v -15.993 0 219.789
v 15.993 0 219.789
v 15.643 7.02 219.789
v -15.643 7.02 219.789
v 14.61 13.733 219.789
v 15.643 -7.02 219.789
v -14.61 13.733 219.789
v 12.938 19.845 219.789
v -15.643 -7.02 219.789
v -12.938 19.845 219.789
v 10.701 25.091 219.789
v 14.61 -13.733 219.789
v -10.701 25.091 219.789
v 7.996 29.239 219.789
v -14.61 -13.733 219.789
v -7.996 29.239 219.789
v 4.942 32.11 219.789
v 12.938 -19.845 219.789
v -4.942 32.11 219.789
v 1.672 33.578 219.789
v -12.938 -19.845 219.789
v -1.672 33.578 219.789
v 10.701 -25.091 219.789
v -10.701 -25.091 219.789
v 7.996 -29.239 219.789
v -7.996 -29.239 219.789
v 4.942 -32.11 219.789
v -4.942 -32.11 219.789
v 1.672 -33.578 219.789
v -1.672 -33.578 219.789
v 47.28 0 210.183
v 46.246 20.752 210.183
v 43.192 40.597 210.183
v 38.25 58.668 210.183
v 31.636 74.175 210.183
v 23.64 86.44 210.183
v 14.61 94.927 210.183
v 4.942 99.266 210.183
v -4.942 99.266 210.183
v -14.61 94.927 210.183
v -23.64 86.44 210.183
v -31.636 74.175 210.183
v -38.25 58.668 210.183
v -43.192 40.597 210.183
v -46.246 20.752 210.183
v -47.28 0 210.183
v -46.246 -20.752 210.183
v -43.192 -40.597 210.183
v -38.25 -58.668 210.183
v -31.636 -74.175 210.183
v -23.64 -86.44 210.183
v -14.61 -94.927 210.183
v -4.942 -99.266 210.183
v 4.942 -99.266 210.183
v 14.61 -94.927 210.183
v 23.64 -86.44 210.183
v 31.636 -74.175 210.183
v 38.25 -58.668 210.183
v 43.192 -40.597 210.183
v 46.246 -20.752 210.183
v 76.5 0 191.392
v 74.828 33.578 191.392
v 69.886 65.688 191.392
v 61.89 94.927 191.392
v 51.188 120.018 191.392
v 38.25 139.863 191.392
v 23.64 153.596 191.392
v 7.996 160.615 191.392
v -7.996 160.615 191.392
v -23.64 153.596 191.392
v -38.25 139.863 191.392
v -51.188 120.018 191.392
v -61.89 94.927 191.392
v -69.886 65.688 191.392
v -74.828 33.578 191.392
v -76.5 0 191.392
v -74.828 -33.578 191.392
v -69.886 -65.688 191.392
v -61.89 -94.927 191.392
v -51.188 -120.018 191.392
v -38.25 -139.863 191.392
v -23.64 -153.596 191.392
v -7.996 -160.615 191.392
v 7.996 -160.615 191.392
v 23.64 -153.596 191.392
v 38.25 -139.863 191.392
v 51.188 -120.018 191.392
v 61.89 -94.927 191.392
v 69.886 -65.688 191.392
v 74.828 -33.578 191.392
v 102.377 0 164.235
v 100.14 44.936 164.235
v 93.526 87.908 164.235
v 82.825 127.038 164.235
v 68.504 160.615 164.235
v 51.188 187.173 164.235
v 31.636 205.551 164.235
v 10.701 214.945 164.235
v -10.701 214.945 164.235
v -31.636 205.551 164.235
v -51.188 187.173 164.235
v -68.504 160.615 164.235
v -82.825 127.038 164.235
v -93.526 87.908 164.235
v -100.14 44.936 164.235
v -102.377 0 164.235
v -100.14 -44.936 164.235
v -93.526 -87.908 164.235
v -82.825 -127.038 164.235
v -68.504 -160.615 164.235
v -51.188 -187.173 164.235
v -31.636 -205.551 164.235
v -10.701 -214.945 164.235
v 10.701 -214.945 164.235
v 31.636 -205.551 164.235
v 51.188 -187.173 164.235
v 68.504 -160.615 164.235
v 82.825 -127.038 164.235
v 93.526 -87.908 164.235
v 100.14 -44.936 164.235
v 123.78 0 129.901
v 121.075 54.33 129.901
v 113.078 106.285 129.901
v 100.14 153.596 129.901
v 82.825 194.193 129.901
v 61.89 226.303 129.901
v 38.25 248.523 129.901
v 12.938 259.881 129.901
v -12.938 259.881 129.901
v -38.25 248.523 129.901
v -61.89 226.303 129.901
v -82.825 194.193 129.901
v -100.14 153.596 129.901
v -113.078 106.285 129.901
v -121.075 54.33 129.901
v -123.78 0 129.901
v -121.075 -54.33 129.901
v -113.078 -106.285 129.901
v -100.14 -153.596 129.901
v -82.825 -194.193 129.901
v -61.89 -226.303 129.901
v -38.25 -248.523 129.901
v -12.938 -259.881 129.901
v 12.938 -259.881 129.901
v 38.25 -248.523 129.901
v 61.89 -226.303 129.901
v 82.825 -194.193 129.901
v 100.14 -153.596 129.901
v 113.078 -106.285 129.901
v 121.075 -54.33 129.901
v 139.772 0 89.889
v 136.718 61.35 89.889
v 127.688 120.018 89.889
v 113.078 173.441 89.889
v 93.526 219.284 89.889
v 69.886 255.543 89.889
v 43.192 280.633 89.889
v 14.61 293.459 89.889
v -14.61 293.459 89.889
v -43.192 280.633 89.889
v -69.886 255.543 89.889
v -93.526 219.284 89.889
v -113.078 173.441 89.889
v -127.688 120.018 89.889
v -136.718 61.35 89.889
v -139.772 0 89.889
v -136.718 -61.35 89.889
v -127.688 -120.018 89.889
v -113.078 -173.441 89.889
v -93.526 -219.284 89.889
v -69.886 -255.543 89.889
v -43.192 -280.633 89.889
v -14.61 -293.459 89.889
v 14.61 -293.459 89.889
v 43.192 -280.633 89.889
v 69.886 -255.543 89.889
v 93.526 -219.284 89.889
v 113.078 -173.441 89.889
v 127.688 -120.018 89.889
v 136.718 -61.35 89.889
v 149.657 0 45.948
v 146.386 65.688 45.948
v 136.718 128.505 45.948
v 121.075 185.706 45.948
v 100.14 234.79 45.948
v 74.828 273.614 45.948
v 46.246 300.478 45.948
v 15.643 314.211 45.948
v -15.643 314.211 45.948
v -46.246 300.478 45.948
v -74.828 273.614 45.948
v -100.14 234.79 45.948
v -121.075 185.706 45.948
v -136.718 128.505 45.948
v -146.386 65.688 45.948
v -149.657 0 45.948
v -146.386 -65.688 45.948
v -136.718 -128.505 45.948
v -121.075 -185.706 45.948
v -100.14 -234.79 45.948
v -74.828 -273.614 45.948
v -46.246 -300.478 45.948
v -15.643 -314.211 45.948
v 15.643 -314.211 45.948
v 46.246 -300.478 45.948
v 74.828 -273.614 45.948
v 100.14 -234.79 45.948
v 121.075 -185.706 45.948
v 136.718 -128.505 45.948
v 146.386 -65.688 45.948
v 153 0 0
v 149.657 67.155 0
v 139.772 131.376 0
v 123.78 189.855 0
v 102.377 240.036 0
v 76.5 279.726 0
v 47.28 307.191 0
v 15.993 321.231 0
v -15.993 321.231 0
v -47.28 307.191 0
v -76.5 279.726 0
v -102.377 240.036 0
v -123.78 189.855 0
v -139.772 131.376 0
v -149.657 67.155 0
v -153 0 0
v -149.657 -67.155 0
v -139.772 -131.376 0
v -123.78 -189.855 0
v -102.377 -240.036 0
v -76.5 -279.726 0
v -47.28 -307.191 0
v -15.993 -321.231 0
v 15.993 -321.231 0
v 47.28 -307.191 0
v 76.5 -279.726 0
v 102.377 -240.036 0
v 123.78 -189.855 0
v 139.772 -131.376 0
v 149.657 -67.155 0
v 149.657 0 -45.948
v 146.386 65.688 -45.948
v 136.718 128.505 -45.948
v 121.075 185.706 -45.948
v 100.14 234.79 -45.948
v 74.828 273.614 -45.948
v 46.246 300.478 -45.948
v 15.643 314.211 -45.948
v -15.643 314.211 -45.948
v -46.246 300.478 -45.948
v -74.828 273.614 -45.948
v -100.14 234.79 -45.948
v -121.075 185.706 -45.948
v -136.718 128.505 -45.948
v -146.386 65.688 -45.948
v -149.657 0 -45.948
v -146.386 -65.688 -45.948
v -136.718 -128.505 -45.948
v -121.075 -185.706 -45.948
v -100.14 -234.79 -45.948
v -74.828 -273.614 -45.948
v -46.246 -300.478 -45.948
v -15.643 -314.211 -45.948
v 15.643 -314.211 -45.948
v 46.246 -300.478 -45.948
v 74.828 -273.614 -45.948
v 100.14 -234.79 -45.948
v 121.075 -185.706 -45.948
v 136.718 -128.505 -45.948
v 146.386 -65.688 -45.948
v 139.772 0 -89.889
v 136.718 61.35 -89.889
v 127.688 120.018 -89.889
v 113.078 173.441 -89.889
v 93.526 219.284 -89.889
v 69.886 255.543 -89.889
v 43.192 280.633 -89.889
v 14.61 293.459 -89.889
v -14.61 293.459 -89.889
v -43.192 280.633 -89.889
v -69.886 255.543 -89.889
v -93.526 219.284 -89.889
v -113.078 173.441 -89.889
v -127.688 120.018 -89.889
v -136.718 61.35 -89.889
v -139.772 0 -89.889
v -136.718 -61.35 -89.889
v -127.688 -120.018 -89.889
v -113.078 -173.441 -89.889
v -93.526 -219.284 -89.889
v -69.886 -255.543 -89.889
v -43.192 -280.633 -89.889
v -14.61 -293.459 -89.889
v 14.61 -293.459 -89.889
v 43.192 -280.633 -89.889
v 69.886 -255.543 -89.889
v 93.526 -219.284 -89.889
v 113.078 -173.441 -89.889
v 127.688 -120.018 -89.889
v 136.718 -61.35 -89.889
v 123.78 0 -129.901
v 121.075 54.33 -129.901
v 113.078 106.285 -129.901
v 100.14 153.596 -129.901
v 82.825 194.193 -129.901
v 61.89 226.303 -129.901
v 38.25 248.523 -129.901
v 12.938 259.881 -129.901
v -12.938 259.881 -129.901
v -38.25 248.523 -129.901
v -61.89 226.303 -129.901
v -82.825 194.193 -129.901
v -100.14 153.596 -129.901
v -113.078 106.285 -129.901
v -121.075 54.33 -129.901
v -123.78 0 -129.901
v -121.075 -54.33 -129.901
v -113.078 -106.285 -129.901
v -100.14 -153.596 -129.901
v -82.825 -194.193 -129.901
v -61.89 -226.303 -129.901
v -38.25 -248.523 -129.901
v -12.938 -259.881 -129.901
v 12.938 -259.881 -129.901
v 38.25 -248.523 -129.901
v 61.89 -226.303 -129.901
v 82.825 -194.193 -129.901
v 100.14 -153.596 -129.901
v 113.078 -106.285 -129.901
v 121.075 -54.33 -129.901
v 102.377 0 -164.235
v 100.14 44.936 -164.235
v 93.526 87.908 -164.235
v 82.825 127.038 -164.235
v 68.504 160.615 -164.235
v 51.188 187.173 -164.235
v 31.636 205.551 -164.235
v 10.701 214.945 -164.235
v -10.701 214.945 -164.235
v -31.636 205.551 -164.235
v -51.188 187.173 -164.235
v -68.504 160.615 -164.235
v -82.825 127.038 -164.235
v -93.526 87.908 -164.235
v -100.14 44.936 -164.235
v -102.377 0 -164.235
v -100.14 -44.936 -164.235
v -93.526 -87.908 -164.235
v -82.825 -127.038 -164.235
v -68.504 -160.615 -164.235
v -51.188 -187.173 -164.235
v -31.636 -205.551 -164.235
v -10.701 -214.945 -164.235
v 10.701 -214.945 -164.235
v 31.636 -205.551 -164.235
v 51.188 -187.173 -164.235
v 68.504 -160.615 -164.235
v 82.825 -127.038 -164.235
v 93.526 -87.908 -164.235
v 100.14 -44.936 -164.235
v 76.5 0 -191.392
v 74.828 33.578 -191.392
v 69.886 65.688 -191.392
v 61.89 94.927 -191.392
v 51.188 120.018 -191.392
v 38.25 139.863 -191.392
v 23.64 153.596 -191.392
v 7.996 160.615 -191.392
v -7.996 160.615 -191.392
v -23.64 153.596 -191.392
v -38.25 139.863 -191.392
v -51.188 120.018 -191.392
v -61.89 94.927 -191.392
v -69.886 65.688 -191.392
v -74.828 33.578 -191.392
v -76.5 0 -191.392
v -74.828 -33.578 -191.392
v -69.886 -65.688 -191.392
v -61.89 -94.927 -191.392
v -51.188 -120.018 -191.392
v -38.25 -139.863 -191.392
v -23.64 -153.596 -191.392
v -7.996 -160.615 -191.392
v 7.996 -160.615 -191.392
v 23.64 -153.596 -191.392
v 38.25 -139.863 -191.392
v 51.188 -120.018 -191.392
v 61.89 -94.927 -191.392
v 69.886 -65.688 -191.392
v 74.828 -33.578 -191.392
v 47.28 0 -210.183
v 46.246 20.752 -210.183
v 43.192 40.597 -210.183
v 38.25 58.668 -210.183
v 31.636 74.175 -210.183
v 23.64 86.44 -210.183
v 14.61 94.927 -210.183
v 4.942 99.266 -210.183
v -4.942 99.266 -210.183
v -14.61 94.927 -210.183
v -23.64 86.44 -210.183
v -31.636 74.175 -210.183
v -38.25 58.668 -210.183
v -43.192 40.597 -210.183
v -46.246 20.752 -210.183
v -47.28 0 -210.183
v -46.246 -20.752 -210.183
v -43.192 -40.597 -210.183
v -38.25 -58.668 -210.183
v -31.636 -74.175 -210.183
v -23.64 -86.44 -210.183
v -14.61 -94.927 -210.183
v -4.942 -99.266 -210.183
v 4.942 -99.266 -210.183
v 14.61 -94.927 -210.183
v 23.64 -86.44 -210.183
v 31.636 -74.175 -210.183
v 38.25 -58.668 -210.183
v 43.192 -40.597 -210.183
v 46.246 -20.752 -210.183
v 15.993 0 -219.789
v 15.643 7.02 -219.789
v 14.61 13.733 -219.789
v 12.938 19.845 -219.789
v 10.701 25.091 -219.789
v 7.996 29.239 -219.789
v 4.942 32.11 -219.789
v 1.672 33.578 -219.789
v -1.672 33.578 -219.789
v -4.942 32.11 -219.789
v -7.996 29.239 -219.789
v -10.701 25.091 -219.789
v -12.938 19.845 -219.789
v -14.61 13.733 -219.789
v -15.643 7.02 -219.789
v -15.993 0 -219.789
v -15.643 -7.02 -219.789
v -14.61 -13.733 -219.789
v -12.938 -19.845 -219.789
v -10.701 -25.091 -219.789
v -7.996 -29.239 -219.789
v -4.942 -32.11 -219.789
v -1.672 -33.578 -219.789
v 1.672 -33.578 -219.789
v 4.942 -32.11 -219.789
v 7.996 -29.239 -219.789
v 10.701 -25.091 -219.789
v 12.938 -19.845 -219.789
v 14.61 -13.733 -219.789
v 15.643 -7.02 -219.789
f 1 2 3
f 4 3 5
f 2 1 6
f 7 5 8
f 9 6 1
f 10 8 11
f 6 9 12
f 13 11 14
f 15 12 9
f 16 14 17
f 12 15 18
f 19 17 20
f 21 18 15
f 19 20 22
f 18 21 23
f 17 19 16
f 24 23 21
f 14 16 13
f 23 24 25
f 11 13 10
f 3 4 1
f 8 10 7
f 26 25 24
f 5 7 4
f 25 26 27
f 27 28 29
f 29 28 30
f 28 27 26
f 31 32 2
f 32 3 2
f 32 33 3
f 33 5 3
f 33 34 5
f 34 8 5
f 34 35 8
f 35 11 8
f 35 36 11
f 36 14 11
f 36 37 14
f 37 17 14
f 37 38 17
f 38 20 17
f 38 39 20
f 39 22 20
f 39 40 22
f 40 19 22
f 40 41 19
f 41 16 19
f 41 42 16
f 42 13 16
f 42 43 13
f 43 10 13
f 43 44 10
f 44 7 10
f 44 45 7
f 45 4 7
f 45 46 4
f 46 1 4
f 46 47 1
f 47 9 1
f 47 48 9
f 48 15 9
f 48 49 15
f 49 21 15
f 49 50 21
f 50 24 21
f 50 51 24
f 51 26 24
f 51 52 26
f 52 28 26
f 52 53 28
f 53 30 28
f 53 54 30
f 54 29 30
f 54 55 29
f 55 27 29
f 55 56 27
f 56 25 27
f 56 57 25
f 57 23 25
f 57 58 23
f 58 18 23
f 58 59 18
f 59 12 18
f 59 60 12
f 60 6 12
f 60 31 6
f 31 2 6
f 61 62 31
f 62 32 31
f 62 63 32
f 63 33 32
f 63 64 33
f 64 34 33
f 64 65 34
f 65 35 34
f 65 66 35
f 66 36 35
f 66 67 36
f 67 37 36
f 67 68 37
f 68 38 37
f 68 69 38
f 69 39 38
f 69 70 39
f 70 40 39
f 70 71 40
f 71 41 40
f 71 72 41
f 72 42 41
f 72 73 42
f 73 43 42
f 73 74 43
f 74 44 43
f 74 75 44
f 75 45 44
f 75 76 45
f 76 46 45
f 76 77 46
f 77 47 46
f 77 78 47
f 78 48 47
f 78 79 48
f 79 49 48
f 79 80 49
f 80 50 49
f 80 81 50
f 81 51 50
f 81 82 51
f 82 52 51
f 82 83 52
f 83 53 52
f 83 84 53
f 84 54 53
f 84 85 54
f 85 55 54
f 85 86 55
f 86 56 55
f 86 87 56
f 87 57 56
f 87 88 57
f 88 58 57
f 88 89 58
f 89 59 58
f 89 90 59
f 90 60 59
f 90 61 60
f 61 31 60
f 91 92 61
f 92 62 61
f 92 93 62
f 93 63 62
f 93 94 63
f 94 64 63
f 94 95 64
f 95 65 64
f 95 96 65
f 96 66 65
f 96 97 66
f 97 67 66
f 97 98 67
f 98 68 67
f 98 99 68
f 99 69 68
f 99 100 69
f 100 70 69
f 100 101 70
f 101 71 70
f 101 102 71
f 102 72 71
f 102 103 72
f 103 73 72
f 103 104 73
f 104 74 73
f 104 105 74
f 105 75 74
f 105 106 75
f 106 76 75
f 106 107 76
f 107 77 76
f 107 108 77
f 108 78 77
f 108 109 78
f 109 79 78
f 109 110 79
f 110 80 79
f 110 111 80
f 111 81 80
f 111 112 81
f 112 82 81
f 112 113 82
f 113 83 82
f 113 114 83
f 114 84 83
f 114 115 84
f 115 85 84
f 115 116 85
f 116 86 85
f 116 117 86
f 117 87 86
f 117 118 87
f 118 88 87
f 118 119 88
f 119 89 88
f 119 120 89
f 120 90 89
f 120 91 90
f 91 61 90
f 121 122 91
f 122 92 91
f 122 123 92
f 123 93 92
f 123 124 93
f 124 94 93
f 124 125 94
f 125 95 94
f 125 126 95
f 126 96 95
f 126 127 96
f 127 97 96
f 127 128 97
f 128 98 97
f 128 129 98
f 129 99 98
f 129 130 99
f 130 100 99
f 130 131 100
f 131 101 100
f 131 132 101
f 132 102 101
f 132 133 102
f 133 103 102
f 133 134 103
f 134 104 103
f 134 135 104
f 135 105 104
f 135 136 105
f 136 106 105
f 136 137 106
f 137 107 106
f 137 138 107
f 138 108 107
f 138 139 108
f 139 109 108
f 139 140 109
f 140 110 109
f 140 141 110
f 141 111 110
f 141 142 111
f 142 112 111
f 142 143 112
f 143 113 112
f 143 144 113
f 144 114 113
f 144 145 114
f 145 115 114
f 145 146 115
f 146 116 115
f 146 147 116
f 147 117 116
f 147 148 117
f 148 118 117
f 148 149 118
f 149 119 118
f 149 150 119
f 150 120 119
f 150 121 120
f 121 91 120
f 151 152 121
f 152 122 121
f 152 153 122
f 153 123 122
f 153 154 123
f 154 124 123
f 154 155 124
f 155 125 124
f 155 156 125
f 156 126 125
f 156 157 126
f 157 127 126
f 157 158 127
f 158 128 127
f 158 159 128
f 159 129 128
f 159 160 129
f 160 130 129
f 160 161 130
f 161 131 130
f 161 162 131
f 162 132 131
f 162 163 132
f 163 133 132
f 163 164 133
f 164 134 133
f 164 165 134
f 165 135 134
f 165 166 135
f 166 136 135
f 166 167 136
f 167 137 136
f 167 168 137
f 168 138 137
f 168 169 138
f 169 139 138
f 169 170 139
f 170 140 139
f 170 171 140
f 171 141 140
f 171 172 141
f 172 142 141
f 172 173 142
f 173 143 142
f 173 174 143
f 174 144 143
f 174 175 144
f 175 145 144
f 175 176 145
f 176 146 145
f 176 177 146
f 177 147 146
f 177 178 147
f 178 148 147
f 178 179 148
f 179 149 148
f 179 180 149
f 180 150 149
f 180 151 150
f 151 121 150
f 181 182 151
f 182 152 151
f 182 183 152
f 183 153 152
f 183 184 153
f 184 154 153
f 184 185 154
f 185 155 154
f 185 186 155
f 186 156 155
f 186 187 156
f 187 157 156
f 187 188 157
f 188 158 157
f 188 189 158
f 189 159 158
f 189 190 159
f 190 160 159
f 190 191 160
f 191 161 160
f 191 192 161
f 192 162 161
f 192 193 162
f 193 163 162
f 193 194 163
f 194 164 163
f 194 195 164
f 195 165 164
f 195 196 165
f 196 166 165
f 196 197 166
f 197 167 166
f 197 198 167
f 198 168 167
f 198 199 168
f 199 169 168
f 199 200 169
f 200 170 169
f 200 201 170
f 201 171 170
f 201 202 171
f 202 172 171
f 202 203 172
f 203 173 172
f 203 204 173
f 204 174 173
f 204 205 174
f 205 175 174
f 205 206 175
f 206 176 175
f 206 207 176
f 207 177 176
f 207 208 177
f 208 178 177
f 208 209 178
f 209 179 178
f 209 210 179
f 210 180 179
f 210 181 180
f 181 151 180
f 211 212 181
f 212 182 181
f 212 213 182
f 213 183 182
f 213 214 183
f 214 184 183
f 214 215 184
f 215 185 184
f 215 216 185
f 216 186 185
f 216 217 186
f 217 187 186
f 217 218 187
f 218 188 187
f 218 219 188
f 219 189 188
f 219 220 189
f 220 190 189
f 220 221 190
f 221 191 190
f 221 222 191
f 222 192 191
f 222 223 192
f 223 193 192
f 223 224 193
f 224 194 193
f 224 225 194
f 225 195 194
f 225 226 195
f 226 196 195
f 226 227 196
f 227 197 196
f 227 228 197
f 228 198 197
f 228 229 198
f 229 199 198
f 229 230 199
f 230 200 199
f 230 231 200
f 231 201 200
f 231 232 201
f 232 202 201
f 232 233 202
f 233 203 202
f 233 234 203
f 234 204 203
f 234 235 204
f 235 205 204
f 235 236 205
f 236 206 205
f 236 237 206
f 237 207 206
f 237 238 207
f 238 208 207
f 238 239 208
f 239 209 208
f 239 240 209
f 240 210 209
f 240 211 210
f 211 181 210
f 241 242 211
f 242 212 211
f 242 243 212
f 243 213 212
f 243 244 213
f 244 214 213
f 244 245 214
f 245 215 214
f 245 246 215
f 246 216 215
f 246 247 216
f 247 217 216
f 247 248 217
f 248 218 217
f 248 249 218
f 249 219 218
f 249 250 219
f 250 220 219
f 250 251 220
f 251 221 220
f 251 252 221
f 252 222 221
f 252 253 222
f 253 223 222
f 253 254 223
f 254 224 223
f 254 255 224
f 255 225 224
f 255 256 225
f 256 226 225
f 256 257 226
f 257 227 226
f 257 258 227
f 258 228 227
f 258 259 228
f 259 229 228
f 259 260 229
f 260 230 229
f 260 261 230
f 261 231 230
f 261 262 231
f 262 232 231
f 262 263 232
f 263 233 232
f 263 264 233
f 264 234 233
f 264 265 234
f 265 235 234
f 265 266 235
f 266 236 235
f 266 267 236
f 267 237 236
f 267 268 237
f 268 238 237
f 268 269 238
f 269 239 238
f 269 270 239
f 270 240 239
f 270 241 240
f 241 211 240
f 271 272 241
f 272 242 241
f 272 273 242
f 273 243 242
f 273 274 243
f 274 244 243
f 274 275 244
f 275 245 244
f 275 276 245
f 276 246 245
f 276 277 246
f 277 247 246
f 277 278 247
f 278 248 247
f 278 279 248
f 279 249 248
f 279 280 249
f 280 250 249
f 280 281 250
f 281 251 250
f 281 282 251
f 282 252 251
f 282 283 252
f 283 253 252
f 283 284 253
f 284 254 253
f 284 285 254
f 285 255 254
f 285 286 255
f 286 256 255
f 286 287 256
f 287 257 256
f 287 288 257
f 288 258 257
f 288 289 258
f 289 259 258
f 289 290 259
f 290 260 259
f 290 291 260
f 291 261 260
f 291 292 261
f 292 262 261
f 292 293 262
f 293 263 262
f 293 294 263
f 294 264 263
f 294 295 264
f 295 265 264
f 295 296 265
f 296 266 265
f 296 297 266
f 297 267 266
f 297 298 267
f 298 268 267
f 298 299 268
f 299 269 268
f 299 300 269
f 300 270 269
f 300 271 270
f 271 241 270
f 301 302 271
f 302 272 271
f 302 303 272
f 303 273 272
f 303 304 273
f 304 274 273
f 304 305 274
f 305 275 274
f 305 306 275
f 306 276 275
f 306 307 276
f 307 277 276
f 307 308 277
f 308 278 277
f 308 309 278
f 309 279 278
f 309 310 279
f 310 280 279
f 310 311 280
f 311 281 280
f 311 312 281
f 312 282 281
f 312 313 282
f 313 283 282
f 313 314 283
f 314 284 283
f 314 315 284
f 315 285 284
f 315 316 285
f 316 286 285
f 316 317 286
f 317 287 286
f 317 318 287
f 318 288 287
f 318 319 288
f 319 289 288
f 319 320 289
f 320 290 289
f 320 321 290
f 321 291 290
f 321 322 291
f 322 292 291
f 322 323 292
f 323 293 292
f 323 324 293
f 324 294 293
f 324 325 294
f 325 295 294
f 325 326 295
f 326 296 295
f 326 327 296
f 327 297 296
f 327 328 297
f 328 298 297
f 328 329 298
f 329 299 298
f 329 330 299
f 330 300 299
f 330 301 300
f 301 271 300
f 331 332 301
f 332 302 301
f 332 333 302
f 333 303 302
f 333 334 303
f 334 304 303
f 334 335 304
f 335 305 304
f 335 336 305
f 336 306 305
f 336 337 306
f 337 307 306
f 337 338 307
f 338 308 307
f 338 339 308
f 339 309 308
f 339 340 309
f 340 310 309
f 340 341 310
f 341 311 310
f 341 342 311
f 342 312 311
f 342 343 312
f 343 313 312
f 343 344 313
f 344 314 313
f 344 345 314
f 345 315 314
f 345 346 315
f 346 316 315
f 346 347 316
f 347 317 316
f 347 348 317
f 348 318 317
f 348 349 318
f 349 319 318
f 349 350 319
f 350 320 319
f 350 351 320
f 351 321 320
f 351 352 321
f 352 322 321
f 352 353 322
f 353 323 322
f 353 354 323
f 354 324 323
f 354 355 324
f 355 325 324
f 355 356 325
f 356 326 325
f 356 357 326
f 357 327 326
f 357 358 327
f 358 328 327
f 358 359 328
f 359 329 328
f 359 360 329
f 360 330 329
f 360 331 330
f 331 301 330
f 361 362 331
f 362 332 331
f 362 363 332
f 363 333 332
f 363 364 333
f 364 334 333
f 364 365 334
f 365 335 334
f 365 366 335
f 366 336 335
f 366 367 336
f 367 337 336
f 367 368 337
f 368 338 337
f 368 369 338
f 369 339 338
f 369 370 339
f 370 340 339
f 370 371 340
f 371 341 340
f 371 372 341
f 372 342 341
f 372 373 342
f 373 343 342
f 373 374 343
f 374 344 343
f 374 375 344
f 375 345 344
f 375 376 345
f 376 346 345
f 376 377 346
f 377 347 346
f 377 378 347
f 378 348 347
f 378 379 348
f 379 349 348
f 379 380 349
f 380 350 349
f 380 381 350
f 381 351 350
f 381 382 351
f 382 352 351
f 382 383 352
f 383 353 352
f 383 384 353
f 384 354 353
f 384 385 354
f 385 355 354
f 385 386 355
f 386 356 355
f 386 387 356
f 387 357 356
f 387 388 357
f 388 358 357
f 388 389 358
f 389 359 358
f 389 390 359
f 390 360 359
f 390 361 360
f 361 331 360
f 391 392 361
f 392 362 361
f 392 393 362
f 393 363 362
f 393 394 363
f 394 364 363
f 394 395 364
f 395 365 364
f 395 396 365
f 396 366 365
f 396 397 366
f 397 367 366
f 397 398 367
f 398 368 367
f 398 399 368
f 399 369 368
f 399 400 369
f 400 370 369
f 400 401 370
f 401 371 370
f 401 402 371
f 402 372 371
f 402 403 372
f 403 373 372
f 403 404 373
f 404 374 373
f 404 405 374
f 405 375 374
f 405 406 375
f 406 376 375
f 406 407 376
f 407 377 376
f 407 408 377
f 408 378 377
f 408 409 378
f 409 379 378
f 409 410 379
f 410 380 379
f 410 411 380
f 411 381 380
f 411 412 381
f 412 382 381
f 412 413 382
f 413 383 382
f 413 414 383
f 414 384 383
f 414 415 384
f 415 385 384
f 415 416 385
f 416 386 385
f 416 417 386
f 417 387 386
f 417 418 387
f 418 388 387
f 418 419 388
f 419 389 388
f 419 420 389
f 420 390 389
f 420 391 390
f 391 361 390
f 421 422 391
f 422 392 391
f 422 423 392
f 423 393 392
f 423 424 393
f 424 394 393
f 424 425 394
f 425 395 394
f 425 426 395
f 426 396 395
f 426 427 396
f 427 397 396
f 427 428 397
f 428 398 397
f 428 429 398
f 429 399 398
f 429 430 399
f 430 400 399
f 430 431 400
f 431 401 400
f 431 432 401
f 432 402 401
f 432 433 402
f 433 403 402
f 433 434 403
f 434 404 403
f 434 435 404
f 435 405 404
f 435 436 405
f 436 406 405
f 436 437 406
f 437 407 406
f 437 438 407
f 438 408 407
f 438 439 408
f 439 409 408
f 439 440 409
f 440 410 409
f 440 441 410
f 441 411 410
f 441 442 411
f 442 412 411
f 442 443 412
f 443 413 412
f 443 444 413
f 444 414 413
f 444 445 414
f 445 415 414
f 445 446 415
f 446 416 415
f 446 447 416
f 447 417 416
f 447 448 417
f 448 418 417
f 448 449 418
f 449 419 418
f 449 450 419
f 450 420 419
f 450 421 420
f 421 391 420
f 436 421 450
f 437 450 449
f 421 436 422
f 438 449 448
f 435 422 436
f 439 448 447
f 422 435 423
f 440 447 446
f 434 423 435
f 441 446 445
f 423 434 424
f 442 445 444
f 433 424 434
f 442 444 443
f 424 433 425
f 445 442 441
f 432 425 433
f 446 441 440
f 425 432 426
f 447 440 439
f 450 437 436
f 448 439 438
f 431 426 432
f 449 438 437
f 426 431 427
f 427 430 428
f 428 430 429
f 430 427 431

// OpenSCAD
// Generated by SolidPython 1.0.1 on 2020-07-29 00:46:49


scale(v = [9, 19, 13]) {
	sphere(r = 17);
}
/***********************************************
*********      SolidPython code:      **********
************************************************
 
# import packages: SolidPython
from solid import *
from solid.utils import *
from itertools import chain, combinations, permutations


class Resize:

    def __init__(self, scad_file):
        self.scad_file = scad_file
        #self.scad_file = import_scad(scad_file)
        # cone/cylinder param:
        self.r1 = 0
        self.r2 = 0
        self.h = 0
        # rectangular prism param:
        self.w = 0
        self.l = 0
        # ellipse param:
        self.r = 0

    # import OpenScad code (file name corresponds to shape)


    # classify shape + parameters
    def assign(self, param1, param2, param3):
        if self.scad_file == 'cone.scad':
            self.r1 = param1
            self.r2 = param2
            self.h = param3
        elif self.scad_file == 'cylinder.scad':
            self.r1 = param1
            self.r2 = param2
            self.h = param3
        elif self.scad_file == 'rectangularPrism.scad':
            self.h = param1
            self.l = param2
            self.w = param3
        else:
            self.r = param1
            self.h = param2

    # resize parameters
    def iterate(self):
        x = range(3, 20, 2)
        i = 1
        if self.scad_file == 'cone.scad':
            tempList = list(permutations(x, 2))
            for temp in tempList:
                param1 = temp[0]
                param2 = temp[1]
                filepath = 'produced_scad_files/' + 'cone' + str(param1) + '_' + str(param2) + '_' + '.scad'
                scad_render_to_file(cylinder(h=param1, r1=param2, r2=0), filepath)

        elif self.scad_file == 'cylinder.scad':
            tempList = list(permutations(x, 3))
            for temp in tempList:
                param1 = temp[0]
                param2 = temp[1]
                filepath = 'produced_scad_files/' + 'cylinder' + str(param1) + '_' + str(param2) + '_' + '.scad'
                scad_render_to_file(cylinder(h=param1, r1=param2, r2=param2), filepath)

        elif self.scad_file == 'rectangularPrism.scad':
            tempList = list(permutations(x, 3))
            for temp in tempList:
                param1 = temp[0]
                param2 = temp[1]
                param3 = temp[2]
                filepath = 'produced_scad_files/' + 'rectangularPrism' + str(param1) + '_' + str(param2) + '_' + str(
                    param3) + '.scad'
                scad_render_to_file(cube(size=(param1, param2, param3)), filepath)

        elif self.scad_file == 'ellipse.scad':
            tempList = list(permutations(x, 4))
            for temp in tempList:
                param1 = temp[0]
                param2 = temp[1]
                param3 = temp[2]
                param4 = temp[3]
                filepath = 'produced_scad_files/' + 'ellipse' + str(param1) + '_' + str(param2) + '_' + str(param3) + '_' + str(param4) + '.scad'
                scad_render_to_file(scale([param1, param2, param3])(sphere(r=param4)), filepath)

    def render_to_scadfile(self):
        scad_render_to_file(scad, 'example.scad') 
 
************************************************/
